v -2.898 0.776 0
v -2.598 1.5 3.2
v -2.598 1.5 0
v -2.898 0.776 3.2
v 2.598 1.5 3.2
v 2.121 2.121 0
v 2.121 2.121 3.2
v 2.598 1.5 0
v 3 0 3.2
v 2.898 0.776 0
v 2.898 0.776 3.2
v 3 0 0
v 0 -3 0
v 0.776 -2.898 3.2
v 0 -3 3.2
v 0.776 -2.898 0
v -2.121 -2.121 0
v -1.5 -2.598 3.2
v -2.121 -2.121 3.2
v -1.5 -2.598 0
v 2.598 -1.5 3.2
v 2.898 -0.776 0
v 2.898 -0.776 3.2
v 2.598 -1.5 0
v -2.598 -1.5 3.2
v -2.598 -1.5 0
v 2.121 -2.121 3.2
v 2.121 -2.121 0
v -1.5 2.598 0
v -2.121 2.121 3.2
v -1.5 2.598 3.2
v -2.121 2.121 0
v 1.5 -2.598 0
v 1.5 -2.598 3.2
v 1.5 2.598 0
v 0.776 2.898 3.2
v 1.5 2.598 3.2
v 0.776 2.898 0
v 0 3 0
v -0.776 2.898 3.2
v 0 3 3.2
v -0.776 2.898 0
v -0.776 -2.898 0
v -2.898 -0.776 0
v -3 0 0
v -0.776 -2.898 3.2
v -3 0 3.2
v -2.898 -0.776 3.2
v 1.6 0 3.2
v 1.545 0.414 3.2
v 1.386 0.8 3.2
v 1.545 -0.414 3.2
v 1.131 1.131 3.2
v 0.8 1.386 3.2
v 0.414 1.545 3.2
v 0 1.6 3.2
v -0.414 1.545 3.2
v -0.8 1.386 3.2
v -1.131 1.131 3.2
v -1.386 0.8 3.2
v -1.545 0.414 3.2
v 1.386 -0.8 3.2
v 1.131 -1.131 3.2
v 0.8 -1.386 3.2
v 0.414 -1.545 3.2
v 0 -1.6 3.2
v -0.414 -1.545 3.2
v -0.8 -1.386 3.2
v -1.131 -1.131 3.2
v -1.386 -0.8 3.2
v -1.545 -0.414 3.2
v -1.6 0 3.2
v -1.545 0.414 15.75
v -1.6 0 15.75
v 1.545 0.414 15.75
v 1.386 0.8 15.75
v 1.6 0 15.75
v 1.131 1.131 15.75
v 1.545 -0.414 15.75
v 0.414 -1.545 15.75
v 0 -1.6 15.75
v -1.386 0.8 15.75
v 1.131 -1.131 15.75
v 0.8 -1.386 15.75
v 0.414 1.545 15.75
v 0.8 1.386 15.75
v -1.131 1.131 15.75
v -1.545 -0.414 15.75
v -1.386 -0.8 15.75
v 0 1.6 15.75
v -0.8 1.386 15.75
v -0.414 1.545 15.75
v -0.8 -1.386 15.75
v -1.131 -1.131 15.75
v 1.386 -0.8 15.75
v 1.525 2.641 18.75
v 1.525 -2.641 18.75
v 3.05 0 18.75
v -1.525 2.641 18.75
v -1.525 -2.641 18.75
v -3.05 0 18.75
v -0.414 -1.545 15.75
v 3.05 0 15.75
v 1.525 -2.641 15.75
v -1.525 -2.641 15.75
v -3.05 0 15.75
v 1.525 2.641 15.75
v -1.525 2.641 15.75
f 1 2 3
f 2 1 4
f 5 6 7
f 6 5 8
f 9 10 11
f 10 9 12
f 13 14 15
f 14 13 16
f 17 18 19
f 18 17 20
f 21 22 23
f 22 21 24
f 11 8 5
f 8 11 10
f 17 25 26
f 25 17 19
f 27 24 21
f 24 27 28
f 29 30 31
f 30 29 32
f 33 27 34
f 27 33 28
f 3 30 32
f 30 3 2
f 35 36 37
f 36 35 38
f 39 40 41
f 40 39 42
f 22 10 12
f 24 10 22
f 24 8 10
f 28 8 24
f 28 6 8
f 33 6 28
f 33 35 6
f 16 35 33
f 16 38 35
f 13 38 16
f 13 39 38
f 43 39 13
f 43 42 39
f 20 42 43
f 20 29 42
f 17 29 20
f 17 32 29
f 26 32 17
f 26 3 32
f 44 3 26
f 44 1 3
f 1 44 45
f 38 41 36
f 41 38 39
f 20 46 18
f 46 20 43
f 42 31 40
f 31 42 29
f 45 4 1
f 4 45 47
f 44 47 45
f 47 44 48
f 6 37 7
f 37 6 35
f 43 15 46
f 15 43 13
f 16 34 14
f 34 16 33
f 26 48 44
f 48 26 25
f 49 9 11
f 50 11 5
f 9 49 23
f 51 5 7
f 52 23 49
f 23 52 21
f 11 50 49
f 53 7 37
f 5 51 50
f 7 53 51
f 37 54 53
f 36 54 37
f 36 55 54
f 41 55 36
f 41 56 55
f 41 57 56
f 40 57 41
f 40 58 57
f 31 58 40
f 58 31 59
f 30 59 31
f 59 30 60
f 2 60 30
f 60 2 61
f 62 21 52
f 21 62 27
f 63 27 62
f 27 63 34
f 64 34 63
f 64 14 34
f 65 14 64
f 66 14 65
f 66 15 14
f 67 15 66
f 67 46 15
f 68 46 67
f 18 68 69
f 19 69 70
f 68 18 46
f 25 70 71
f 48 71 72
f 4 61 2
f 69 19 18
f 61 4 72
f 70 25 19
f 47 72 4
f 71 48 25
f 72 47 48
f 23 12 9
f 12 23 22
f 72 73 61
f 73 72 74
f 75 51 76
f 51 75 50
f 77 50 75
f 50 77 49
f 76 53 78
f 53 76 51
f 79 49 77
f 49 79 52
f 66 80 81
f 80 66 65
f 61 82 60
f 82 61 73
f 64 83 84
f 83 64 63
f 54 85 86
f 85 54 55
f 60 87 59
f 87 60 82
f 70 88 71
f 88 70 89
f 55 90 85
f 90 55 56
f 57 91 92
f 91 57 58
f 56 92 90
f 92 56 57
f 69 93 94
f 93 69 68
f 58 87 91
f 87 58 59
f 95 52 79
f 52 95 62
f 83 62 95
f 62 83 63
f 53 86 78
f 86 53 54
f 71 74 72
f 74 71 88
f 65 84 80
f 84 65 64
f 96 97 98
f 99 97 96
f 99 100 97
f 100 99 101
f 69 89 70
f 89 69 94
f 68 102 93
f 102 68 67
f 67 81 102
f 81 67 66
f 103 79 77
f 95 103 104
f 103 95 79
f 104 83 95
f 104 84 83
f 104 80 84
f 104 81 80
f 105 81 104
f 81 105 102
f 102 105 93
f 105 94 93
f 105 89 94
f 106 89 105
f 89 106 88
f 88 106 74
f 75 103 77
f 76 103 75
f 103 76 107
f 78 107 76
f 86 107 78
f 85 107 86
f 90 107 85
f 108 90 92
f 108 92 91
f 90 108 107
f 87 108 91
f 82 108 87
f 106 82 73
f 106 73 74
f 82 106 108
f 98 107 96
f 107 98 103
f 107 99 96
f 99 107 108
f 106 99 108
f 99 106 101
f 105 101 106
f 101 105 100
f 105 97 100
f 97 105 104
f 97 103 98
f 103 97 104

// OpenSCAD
// A small module defining some #6 hardware shapes
// Use solid=true to get the ouerall size of a cutout
// Use tol = .1 (or similar) to allow for printer inaccuracy
// 
screw_and_nut(18.75, tol=0.0);
//hex_nut_slot(10);

diameter      = 3.2;
nut_outer_dia = 6.1;
nut_thickness = 3;
head_height = 3.2;
head_dia    = 6;


module screw_and_nut(length, tol=0.0) {
    translate ([0, 0, length-(nut_thickness+tol)]) 
        hex_nut(tol=tol, solid=false);
    machine_screw(length, tol=tol);
}

    
module hex_nut(tol = 0, solid = false) {
    linear_extrude (nut_thickness+tol) {
        difference () {
            circle(tol + nut_outer_dia/2, $fn = 6);
            if (!solid)
                circle(diameter/2, $fn = 24);
        }

    }
}


module machine_screw(length, tol=0)
{
    union() {
        translate([0, 0, tol]) {
            cylinder(head_height, tol+head_dia/2, tol+head_dia/2, $fn=24);
            cylinder(length-tol, tol+diameter/2, tol+diameter/2, $fn=24);
        }
        cylinder(tol+.01, tol+head_dia/2, tol+head_dia/2, $fn=24);
    }
}


module hex_nut_slot(length, tol = 0) {
    linear_extrude (nut_thickness+tol) {
        circle(tol + nut_outer_dia/2, $fn = 6);
        translate([-(tol + nut_outer_dia/2), 0, 0])
            square([tol + nut_outer_dia, length]);
    }
}
